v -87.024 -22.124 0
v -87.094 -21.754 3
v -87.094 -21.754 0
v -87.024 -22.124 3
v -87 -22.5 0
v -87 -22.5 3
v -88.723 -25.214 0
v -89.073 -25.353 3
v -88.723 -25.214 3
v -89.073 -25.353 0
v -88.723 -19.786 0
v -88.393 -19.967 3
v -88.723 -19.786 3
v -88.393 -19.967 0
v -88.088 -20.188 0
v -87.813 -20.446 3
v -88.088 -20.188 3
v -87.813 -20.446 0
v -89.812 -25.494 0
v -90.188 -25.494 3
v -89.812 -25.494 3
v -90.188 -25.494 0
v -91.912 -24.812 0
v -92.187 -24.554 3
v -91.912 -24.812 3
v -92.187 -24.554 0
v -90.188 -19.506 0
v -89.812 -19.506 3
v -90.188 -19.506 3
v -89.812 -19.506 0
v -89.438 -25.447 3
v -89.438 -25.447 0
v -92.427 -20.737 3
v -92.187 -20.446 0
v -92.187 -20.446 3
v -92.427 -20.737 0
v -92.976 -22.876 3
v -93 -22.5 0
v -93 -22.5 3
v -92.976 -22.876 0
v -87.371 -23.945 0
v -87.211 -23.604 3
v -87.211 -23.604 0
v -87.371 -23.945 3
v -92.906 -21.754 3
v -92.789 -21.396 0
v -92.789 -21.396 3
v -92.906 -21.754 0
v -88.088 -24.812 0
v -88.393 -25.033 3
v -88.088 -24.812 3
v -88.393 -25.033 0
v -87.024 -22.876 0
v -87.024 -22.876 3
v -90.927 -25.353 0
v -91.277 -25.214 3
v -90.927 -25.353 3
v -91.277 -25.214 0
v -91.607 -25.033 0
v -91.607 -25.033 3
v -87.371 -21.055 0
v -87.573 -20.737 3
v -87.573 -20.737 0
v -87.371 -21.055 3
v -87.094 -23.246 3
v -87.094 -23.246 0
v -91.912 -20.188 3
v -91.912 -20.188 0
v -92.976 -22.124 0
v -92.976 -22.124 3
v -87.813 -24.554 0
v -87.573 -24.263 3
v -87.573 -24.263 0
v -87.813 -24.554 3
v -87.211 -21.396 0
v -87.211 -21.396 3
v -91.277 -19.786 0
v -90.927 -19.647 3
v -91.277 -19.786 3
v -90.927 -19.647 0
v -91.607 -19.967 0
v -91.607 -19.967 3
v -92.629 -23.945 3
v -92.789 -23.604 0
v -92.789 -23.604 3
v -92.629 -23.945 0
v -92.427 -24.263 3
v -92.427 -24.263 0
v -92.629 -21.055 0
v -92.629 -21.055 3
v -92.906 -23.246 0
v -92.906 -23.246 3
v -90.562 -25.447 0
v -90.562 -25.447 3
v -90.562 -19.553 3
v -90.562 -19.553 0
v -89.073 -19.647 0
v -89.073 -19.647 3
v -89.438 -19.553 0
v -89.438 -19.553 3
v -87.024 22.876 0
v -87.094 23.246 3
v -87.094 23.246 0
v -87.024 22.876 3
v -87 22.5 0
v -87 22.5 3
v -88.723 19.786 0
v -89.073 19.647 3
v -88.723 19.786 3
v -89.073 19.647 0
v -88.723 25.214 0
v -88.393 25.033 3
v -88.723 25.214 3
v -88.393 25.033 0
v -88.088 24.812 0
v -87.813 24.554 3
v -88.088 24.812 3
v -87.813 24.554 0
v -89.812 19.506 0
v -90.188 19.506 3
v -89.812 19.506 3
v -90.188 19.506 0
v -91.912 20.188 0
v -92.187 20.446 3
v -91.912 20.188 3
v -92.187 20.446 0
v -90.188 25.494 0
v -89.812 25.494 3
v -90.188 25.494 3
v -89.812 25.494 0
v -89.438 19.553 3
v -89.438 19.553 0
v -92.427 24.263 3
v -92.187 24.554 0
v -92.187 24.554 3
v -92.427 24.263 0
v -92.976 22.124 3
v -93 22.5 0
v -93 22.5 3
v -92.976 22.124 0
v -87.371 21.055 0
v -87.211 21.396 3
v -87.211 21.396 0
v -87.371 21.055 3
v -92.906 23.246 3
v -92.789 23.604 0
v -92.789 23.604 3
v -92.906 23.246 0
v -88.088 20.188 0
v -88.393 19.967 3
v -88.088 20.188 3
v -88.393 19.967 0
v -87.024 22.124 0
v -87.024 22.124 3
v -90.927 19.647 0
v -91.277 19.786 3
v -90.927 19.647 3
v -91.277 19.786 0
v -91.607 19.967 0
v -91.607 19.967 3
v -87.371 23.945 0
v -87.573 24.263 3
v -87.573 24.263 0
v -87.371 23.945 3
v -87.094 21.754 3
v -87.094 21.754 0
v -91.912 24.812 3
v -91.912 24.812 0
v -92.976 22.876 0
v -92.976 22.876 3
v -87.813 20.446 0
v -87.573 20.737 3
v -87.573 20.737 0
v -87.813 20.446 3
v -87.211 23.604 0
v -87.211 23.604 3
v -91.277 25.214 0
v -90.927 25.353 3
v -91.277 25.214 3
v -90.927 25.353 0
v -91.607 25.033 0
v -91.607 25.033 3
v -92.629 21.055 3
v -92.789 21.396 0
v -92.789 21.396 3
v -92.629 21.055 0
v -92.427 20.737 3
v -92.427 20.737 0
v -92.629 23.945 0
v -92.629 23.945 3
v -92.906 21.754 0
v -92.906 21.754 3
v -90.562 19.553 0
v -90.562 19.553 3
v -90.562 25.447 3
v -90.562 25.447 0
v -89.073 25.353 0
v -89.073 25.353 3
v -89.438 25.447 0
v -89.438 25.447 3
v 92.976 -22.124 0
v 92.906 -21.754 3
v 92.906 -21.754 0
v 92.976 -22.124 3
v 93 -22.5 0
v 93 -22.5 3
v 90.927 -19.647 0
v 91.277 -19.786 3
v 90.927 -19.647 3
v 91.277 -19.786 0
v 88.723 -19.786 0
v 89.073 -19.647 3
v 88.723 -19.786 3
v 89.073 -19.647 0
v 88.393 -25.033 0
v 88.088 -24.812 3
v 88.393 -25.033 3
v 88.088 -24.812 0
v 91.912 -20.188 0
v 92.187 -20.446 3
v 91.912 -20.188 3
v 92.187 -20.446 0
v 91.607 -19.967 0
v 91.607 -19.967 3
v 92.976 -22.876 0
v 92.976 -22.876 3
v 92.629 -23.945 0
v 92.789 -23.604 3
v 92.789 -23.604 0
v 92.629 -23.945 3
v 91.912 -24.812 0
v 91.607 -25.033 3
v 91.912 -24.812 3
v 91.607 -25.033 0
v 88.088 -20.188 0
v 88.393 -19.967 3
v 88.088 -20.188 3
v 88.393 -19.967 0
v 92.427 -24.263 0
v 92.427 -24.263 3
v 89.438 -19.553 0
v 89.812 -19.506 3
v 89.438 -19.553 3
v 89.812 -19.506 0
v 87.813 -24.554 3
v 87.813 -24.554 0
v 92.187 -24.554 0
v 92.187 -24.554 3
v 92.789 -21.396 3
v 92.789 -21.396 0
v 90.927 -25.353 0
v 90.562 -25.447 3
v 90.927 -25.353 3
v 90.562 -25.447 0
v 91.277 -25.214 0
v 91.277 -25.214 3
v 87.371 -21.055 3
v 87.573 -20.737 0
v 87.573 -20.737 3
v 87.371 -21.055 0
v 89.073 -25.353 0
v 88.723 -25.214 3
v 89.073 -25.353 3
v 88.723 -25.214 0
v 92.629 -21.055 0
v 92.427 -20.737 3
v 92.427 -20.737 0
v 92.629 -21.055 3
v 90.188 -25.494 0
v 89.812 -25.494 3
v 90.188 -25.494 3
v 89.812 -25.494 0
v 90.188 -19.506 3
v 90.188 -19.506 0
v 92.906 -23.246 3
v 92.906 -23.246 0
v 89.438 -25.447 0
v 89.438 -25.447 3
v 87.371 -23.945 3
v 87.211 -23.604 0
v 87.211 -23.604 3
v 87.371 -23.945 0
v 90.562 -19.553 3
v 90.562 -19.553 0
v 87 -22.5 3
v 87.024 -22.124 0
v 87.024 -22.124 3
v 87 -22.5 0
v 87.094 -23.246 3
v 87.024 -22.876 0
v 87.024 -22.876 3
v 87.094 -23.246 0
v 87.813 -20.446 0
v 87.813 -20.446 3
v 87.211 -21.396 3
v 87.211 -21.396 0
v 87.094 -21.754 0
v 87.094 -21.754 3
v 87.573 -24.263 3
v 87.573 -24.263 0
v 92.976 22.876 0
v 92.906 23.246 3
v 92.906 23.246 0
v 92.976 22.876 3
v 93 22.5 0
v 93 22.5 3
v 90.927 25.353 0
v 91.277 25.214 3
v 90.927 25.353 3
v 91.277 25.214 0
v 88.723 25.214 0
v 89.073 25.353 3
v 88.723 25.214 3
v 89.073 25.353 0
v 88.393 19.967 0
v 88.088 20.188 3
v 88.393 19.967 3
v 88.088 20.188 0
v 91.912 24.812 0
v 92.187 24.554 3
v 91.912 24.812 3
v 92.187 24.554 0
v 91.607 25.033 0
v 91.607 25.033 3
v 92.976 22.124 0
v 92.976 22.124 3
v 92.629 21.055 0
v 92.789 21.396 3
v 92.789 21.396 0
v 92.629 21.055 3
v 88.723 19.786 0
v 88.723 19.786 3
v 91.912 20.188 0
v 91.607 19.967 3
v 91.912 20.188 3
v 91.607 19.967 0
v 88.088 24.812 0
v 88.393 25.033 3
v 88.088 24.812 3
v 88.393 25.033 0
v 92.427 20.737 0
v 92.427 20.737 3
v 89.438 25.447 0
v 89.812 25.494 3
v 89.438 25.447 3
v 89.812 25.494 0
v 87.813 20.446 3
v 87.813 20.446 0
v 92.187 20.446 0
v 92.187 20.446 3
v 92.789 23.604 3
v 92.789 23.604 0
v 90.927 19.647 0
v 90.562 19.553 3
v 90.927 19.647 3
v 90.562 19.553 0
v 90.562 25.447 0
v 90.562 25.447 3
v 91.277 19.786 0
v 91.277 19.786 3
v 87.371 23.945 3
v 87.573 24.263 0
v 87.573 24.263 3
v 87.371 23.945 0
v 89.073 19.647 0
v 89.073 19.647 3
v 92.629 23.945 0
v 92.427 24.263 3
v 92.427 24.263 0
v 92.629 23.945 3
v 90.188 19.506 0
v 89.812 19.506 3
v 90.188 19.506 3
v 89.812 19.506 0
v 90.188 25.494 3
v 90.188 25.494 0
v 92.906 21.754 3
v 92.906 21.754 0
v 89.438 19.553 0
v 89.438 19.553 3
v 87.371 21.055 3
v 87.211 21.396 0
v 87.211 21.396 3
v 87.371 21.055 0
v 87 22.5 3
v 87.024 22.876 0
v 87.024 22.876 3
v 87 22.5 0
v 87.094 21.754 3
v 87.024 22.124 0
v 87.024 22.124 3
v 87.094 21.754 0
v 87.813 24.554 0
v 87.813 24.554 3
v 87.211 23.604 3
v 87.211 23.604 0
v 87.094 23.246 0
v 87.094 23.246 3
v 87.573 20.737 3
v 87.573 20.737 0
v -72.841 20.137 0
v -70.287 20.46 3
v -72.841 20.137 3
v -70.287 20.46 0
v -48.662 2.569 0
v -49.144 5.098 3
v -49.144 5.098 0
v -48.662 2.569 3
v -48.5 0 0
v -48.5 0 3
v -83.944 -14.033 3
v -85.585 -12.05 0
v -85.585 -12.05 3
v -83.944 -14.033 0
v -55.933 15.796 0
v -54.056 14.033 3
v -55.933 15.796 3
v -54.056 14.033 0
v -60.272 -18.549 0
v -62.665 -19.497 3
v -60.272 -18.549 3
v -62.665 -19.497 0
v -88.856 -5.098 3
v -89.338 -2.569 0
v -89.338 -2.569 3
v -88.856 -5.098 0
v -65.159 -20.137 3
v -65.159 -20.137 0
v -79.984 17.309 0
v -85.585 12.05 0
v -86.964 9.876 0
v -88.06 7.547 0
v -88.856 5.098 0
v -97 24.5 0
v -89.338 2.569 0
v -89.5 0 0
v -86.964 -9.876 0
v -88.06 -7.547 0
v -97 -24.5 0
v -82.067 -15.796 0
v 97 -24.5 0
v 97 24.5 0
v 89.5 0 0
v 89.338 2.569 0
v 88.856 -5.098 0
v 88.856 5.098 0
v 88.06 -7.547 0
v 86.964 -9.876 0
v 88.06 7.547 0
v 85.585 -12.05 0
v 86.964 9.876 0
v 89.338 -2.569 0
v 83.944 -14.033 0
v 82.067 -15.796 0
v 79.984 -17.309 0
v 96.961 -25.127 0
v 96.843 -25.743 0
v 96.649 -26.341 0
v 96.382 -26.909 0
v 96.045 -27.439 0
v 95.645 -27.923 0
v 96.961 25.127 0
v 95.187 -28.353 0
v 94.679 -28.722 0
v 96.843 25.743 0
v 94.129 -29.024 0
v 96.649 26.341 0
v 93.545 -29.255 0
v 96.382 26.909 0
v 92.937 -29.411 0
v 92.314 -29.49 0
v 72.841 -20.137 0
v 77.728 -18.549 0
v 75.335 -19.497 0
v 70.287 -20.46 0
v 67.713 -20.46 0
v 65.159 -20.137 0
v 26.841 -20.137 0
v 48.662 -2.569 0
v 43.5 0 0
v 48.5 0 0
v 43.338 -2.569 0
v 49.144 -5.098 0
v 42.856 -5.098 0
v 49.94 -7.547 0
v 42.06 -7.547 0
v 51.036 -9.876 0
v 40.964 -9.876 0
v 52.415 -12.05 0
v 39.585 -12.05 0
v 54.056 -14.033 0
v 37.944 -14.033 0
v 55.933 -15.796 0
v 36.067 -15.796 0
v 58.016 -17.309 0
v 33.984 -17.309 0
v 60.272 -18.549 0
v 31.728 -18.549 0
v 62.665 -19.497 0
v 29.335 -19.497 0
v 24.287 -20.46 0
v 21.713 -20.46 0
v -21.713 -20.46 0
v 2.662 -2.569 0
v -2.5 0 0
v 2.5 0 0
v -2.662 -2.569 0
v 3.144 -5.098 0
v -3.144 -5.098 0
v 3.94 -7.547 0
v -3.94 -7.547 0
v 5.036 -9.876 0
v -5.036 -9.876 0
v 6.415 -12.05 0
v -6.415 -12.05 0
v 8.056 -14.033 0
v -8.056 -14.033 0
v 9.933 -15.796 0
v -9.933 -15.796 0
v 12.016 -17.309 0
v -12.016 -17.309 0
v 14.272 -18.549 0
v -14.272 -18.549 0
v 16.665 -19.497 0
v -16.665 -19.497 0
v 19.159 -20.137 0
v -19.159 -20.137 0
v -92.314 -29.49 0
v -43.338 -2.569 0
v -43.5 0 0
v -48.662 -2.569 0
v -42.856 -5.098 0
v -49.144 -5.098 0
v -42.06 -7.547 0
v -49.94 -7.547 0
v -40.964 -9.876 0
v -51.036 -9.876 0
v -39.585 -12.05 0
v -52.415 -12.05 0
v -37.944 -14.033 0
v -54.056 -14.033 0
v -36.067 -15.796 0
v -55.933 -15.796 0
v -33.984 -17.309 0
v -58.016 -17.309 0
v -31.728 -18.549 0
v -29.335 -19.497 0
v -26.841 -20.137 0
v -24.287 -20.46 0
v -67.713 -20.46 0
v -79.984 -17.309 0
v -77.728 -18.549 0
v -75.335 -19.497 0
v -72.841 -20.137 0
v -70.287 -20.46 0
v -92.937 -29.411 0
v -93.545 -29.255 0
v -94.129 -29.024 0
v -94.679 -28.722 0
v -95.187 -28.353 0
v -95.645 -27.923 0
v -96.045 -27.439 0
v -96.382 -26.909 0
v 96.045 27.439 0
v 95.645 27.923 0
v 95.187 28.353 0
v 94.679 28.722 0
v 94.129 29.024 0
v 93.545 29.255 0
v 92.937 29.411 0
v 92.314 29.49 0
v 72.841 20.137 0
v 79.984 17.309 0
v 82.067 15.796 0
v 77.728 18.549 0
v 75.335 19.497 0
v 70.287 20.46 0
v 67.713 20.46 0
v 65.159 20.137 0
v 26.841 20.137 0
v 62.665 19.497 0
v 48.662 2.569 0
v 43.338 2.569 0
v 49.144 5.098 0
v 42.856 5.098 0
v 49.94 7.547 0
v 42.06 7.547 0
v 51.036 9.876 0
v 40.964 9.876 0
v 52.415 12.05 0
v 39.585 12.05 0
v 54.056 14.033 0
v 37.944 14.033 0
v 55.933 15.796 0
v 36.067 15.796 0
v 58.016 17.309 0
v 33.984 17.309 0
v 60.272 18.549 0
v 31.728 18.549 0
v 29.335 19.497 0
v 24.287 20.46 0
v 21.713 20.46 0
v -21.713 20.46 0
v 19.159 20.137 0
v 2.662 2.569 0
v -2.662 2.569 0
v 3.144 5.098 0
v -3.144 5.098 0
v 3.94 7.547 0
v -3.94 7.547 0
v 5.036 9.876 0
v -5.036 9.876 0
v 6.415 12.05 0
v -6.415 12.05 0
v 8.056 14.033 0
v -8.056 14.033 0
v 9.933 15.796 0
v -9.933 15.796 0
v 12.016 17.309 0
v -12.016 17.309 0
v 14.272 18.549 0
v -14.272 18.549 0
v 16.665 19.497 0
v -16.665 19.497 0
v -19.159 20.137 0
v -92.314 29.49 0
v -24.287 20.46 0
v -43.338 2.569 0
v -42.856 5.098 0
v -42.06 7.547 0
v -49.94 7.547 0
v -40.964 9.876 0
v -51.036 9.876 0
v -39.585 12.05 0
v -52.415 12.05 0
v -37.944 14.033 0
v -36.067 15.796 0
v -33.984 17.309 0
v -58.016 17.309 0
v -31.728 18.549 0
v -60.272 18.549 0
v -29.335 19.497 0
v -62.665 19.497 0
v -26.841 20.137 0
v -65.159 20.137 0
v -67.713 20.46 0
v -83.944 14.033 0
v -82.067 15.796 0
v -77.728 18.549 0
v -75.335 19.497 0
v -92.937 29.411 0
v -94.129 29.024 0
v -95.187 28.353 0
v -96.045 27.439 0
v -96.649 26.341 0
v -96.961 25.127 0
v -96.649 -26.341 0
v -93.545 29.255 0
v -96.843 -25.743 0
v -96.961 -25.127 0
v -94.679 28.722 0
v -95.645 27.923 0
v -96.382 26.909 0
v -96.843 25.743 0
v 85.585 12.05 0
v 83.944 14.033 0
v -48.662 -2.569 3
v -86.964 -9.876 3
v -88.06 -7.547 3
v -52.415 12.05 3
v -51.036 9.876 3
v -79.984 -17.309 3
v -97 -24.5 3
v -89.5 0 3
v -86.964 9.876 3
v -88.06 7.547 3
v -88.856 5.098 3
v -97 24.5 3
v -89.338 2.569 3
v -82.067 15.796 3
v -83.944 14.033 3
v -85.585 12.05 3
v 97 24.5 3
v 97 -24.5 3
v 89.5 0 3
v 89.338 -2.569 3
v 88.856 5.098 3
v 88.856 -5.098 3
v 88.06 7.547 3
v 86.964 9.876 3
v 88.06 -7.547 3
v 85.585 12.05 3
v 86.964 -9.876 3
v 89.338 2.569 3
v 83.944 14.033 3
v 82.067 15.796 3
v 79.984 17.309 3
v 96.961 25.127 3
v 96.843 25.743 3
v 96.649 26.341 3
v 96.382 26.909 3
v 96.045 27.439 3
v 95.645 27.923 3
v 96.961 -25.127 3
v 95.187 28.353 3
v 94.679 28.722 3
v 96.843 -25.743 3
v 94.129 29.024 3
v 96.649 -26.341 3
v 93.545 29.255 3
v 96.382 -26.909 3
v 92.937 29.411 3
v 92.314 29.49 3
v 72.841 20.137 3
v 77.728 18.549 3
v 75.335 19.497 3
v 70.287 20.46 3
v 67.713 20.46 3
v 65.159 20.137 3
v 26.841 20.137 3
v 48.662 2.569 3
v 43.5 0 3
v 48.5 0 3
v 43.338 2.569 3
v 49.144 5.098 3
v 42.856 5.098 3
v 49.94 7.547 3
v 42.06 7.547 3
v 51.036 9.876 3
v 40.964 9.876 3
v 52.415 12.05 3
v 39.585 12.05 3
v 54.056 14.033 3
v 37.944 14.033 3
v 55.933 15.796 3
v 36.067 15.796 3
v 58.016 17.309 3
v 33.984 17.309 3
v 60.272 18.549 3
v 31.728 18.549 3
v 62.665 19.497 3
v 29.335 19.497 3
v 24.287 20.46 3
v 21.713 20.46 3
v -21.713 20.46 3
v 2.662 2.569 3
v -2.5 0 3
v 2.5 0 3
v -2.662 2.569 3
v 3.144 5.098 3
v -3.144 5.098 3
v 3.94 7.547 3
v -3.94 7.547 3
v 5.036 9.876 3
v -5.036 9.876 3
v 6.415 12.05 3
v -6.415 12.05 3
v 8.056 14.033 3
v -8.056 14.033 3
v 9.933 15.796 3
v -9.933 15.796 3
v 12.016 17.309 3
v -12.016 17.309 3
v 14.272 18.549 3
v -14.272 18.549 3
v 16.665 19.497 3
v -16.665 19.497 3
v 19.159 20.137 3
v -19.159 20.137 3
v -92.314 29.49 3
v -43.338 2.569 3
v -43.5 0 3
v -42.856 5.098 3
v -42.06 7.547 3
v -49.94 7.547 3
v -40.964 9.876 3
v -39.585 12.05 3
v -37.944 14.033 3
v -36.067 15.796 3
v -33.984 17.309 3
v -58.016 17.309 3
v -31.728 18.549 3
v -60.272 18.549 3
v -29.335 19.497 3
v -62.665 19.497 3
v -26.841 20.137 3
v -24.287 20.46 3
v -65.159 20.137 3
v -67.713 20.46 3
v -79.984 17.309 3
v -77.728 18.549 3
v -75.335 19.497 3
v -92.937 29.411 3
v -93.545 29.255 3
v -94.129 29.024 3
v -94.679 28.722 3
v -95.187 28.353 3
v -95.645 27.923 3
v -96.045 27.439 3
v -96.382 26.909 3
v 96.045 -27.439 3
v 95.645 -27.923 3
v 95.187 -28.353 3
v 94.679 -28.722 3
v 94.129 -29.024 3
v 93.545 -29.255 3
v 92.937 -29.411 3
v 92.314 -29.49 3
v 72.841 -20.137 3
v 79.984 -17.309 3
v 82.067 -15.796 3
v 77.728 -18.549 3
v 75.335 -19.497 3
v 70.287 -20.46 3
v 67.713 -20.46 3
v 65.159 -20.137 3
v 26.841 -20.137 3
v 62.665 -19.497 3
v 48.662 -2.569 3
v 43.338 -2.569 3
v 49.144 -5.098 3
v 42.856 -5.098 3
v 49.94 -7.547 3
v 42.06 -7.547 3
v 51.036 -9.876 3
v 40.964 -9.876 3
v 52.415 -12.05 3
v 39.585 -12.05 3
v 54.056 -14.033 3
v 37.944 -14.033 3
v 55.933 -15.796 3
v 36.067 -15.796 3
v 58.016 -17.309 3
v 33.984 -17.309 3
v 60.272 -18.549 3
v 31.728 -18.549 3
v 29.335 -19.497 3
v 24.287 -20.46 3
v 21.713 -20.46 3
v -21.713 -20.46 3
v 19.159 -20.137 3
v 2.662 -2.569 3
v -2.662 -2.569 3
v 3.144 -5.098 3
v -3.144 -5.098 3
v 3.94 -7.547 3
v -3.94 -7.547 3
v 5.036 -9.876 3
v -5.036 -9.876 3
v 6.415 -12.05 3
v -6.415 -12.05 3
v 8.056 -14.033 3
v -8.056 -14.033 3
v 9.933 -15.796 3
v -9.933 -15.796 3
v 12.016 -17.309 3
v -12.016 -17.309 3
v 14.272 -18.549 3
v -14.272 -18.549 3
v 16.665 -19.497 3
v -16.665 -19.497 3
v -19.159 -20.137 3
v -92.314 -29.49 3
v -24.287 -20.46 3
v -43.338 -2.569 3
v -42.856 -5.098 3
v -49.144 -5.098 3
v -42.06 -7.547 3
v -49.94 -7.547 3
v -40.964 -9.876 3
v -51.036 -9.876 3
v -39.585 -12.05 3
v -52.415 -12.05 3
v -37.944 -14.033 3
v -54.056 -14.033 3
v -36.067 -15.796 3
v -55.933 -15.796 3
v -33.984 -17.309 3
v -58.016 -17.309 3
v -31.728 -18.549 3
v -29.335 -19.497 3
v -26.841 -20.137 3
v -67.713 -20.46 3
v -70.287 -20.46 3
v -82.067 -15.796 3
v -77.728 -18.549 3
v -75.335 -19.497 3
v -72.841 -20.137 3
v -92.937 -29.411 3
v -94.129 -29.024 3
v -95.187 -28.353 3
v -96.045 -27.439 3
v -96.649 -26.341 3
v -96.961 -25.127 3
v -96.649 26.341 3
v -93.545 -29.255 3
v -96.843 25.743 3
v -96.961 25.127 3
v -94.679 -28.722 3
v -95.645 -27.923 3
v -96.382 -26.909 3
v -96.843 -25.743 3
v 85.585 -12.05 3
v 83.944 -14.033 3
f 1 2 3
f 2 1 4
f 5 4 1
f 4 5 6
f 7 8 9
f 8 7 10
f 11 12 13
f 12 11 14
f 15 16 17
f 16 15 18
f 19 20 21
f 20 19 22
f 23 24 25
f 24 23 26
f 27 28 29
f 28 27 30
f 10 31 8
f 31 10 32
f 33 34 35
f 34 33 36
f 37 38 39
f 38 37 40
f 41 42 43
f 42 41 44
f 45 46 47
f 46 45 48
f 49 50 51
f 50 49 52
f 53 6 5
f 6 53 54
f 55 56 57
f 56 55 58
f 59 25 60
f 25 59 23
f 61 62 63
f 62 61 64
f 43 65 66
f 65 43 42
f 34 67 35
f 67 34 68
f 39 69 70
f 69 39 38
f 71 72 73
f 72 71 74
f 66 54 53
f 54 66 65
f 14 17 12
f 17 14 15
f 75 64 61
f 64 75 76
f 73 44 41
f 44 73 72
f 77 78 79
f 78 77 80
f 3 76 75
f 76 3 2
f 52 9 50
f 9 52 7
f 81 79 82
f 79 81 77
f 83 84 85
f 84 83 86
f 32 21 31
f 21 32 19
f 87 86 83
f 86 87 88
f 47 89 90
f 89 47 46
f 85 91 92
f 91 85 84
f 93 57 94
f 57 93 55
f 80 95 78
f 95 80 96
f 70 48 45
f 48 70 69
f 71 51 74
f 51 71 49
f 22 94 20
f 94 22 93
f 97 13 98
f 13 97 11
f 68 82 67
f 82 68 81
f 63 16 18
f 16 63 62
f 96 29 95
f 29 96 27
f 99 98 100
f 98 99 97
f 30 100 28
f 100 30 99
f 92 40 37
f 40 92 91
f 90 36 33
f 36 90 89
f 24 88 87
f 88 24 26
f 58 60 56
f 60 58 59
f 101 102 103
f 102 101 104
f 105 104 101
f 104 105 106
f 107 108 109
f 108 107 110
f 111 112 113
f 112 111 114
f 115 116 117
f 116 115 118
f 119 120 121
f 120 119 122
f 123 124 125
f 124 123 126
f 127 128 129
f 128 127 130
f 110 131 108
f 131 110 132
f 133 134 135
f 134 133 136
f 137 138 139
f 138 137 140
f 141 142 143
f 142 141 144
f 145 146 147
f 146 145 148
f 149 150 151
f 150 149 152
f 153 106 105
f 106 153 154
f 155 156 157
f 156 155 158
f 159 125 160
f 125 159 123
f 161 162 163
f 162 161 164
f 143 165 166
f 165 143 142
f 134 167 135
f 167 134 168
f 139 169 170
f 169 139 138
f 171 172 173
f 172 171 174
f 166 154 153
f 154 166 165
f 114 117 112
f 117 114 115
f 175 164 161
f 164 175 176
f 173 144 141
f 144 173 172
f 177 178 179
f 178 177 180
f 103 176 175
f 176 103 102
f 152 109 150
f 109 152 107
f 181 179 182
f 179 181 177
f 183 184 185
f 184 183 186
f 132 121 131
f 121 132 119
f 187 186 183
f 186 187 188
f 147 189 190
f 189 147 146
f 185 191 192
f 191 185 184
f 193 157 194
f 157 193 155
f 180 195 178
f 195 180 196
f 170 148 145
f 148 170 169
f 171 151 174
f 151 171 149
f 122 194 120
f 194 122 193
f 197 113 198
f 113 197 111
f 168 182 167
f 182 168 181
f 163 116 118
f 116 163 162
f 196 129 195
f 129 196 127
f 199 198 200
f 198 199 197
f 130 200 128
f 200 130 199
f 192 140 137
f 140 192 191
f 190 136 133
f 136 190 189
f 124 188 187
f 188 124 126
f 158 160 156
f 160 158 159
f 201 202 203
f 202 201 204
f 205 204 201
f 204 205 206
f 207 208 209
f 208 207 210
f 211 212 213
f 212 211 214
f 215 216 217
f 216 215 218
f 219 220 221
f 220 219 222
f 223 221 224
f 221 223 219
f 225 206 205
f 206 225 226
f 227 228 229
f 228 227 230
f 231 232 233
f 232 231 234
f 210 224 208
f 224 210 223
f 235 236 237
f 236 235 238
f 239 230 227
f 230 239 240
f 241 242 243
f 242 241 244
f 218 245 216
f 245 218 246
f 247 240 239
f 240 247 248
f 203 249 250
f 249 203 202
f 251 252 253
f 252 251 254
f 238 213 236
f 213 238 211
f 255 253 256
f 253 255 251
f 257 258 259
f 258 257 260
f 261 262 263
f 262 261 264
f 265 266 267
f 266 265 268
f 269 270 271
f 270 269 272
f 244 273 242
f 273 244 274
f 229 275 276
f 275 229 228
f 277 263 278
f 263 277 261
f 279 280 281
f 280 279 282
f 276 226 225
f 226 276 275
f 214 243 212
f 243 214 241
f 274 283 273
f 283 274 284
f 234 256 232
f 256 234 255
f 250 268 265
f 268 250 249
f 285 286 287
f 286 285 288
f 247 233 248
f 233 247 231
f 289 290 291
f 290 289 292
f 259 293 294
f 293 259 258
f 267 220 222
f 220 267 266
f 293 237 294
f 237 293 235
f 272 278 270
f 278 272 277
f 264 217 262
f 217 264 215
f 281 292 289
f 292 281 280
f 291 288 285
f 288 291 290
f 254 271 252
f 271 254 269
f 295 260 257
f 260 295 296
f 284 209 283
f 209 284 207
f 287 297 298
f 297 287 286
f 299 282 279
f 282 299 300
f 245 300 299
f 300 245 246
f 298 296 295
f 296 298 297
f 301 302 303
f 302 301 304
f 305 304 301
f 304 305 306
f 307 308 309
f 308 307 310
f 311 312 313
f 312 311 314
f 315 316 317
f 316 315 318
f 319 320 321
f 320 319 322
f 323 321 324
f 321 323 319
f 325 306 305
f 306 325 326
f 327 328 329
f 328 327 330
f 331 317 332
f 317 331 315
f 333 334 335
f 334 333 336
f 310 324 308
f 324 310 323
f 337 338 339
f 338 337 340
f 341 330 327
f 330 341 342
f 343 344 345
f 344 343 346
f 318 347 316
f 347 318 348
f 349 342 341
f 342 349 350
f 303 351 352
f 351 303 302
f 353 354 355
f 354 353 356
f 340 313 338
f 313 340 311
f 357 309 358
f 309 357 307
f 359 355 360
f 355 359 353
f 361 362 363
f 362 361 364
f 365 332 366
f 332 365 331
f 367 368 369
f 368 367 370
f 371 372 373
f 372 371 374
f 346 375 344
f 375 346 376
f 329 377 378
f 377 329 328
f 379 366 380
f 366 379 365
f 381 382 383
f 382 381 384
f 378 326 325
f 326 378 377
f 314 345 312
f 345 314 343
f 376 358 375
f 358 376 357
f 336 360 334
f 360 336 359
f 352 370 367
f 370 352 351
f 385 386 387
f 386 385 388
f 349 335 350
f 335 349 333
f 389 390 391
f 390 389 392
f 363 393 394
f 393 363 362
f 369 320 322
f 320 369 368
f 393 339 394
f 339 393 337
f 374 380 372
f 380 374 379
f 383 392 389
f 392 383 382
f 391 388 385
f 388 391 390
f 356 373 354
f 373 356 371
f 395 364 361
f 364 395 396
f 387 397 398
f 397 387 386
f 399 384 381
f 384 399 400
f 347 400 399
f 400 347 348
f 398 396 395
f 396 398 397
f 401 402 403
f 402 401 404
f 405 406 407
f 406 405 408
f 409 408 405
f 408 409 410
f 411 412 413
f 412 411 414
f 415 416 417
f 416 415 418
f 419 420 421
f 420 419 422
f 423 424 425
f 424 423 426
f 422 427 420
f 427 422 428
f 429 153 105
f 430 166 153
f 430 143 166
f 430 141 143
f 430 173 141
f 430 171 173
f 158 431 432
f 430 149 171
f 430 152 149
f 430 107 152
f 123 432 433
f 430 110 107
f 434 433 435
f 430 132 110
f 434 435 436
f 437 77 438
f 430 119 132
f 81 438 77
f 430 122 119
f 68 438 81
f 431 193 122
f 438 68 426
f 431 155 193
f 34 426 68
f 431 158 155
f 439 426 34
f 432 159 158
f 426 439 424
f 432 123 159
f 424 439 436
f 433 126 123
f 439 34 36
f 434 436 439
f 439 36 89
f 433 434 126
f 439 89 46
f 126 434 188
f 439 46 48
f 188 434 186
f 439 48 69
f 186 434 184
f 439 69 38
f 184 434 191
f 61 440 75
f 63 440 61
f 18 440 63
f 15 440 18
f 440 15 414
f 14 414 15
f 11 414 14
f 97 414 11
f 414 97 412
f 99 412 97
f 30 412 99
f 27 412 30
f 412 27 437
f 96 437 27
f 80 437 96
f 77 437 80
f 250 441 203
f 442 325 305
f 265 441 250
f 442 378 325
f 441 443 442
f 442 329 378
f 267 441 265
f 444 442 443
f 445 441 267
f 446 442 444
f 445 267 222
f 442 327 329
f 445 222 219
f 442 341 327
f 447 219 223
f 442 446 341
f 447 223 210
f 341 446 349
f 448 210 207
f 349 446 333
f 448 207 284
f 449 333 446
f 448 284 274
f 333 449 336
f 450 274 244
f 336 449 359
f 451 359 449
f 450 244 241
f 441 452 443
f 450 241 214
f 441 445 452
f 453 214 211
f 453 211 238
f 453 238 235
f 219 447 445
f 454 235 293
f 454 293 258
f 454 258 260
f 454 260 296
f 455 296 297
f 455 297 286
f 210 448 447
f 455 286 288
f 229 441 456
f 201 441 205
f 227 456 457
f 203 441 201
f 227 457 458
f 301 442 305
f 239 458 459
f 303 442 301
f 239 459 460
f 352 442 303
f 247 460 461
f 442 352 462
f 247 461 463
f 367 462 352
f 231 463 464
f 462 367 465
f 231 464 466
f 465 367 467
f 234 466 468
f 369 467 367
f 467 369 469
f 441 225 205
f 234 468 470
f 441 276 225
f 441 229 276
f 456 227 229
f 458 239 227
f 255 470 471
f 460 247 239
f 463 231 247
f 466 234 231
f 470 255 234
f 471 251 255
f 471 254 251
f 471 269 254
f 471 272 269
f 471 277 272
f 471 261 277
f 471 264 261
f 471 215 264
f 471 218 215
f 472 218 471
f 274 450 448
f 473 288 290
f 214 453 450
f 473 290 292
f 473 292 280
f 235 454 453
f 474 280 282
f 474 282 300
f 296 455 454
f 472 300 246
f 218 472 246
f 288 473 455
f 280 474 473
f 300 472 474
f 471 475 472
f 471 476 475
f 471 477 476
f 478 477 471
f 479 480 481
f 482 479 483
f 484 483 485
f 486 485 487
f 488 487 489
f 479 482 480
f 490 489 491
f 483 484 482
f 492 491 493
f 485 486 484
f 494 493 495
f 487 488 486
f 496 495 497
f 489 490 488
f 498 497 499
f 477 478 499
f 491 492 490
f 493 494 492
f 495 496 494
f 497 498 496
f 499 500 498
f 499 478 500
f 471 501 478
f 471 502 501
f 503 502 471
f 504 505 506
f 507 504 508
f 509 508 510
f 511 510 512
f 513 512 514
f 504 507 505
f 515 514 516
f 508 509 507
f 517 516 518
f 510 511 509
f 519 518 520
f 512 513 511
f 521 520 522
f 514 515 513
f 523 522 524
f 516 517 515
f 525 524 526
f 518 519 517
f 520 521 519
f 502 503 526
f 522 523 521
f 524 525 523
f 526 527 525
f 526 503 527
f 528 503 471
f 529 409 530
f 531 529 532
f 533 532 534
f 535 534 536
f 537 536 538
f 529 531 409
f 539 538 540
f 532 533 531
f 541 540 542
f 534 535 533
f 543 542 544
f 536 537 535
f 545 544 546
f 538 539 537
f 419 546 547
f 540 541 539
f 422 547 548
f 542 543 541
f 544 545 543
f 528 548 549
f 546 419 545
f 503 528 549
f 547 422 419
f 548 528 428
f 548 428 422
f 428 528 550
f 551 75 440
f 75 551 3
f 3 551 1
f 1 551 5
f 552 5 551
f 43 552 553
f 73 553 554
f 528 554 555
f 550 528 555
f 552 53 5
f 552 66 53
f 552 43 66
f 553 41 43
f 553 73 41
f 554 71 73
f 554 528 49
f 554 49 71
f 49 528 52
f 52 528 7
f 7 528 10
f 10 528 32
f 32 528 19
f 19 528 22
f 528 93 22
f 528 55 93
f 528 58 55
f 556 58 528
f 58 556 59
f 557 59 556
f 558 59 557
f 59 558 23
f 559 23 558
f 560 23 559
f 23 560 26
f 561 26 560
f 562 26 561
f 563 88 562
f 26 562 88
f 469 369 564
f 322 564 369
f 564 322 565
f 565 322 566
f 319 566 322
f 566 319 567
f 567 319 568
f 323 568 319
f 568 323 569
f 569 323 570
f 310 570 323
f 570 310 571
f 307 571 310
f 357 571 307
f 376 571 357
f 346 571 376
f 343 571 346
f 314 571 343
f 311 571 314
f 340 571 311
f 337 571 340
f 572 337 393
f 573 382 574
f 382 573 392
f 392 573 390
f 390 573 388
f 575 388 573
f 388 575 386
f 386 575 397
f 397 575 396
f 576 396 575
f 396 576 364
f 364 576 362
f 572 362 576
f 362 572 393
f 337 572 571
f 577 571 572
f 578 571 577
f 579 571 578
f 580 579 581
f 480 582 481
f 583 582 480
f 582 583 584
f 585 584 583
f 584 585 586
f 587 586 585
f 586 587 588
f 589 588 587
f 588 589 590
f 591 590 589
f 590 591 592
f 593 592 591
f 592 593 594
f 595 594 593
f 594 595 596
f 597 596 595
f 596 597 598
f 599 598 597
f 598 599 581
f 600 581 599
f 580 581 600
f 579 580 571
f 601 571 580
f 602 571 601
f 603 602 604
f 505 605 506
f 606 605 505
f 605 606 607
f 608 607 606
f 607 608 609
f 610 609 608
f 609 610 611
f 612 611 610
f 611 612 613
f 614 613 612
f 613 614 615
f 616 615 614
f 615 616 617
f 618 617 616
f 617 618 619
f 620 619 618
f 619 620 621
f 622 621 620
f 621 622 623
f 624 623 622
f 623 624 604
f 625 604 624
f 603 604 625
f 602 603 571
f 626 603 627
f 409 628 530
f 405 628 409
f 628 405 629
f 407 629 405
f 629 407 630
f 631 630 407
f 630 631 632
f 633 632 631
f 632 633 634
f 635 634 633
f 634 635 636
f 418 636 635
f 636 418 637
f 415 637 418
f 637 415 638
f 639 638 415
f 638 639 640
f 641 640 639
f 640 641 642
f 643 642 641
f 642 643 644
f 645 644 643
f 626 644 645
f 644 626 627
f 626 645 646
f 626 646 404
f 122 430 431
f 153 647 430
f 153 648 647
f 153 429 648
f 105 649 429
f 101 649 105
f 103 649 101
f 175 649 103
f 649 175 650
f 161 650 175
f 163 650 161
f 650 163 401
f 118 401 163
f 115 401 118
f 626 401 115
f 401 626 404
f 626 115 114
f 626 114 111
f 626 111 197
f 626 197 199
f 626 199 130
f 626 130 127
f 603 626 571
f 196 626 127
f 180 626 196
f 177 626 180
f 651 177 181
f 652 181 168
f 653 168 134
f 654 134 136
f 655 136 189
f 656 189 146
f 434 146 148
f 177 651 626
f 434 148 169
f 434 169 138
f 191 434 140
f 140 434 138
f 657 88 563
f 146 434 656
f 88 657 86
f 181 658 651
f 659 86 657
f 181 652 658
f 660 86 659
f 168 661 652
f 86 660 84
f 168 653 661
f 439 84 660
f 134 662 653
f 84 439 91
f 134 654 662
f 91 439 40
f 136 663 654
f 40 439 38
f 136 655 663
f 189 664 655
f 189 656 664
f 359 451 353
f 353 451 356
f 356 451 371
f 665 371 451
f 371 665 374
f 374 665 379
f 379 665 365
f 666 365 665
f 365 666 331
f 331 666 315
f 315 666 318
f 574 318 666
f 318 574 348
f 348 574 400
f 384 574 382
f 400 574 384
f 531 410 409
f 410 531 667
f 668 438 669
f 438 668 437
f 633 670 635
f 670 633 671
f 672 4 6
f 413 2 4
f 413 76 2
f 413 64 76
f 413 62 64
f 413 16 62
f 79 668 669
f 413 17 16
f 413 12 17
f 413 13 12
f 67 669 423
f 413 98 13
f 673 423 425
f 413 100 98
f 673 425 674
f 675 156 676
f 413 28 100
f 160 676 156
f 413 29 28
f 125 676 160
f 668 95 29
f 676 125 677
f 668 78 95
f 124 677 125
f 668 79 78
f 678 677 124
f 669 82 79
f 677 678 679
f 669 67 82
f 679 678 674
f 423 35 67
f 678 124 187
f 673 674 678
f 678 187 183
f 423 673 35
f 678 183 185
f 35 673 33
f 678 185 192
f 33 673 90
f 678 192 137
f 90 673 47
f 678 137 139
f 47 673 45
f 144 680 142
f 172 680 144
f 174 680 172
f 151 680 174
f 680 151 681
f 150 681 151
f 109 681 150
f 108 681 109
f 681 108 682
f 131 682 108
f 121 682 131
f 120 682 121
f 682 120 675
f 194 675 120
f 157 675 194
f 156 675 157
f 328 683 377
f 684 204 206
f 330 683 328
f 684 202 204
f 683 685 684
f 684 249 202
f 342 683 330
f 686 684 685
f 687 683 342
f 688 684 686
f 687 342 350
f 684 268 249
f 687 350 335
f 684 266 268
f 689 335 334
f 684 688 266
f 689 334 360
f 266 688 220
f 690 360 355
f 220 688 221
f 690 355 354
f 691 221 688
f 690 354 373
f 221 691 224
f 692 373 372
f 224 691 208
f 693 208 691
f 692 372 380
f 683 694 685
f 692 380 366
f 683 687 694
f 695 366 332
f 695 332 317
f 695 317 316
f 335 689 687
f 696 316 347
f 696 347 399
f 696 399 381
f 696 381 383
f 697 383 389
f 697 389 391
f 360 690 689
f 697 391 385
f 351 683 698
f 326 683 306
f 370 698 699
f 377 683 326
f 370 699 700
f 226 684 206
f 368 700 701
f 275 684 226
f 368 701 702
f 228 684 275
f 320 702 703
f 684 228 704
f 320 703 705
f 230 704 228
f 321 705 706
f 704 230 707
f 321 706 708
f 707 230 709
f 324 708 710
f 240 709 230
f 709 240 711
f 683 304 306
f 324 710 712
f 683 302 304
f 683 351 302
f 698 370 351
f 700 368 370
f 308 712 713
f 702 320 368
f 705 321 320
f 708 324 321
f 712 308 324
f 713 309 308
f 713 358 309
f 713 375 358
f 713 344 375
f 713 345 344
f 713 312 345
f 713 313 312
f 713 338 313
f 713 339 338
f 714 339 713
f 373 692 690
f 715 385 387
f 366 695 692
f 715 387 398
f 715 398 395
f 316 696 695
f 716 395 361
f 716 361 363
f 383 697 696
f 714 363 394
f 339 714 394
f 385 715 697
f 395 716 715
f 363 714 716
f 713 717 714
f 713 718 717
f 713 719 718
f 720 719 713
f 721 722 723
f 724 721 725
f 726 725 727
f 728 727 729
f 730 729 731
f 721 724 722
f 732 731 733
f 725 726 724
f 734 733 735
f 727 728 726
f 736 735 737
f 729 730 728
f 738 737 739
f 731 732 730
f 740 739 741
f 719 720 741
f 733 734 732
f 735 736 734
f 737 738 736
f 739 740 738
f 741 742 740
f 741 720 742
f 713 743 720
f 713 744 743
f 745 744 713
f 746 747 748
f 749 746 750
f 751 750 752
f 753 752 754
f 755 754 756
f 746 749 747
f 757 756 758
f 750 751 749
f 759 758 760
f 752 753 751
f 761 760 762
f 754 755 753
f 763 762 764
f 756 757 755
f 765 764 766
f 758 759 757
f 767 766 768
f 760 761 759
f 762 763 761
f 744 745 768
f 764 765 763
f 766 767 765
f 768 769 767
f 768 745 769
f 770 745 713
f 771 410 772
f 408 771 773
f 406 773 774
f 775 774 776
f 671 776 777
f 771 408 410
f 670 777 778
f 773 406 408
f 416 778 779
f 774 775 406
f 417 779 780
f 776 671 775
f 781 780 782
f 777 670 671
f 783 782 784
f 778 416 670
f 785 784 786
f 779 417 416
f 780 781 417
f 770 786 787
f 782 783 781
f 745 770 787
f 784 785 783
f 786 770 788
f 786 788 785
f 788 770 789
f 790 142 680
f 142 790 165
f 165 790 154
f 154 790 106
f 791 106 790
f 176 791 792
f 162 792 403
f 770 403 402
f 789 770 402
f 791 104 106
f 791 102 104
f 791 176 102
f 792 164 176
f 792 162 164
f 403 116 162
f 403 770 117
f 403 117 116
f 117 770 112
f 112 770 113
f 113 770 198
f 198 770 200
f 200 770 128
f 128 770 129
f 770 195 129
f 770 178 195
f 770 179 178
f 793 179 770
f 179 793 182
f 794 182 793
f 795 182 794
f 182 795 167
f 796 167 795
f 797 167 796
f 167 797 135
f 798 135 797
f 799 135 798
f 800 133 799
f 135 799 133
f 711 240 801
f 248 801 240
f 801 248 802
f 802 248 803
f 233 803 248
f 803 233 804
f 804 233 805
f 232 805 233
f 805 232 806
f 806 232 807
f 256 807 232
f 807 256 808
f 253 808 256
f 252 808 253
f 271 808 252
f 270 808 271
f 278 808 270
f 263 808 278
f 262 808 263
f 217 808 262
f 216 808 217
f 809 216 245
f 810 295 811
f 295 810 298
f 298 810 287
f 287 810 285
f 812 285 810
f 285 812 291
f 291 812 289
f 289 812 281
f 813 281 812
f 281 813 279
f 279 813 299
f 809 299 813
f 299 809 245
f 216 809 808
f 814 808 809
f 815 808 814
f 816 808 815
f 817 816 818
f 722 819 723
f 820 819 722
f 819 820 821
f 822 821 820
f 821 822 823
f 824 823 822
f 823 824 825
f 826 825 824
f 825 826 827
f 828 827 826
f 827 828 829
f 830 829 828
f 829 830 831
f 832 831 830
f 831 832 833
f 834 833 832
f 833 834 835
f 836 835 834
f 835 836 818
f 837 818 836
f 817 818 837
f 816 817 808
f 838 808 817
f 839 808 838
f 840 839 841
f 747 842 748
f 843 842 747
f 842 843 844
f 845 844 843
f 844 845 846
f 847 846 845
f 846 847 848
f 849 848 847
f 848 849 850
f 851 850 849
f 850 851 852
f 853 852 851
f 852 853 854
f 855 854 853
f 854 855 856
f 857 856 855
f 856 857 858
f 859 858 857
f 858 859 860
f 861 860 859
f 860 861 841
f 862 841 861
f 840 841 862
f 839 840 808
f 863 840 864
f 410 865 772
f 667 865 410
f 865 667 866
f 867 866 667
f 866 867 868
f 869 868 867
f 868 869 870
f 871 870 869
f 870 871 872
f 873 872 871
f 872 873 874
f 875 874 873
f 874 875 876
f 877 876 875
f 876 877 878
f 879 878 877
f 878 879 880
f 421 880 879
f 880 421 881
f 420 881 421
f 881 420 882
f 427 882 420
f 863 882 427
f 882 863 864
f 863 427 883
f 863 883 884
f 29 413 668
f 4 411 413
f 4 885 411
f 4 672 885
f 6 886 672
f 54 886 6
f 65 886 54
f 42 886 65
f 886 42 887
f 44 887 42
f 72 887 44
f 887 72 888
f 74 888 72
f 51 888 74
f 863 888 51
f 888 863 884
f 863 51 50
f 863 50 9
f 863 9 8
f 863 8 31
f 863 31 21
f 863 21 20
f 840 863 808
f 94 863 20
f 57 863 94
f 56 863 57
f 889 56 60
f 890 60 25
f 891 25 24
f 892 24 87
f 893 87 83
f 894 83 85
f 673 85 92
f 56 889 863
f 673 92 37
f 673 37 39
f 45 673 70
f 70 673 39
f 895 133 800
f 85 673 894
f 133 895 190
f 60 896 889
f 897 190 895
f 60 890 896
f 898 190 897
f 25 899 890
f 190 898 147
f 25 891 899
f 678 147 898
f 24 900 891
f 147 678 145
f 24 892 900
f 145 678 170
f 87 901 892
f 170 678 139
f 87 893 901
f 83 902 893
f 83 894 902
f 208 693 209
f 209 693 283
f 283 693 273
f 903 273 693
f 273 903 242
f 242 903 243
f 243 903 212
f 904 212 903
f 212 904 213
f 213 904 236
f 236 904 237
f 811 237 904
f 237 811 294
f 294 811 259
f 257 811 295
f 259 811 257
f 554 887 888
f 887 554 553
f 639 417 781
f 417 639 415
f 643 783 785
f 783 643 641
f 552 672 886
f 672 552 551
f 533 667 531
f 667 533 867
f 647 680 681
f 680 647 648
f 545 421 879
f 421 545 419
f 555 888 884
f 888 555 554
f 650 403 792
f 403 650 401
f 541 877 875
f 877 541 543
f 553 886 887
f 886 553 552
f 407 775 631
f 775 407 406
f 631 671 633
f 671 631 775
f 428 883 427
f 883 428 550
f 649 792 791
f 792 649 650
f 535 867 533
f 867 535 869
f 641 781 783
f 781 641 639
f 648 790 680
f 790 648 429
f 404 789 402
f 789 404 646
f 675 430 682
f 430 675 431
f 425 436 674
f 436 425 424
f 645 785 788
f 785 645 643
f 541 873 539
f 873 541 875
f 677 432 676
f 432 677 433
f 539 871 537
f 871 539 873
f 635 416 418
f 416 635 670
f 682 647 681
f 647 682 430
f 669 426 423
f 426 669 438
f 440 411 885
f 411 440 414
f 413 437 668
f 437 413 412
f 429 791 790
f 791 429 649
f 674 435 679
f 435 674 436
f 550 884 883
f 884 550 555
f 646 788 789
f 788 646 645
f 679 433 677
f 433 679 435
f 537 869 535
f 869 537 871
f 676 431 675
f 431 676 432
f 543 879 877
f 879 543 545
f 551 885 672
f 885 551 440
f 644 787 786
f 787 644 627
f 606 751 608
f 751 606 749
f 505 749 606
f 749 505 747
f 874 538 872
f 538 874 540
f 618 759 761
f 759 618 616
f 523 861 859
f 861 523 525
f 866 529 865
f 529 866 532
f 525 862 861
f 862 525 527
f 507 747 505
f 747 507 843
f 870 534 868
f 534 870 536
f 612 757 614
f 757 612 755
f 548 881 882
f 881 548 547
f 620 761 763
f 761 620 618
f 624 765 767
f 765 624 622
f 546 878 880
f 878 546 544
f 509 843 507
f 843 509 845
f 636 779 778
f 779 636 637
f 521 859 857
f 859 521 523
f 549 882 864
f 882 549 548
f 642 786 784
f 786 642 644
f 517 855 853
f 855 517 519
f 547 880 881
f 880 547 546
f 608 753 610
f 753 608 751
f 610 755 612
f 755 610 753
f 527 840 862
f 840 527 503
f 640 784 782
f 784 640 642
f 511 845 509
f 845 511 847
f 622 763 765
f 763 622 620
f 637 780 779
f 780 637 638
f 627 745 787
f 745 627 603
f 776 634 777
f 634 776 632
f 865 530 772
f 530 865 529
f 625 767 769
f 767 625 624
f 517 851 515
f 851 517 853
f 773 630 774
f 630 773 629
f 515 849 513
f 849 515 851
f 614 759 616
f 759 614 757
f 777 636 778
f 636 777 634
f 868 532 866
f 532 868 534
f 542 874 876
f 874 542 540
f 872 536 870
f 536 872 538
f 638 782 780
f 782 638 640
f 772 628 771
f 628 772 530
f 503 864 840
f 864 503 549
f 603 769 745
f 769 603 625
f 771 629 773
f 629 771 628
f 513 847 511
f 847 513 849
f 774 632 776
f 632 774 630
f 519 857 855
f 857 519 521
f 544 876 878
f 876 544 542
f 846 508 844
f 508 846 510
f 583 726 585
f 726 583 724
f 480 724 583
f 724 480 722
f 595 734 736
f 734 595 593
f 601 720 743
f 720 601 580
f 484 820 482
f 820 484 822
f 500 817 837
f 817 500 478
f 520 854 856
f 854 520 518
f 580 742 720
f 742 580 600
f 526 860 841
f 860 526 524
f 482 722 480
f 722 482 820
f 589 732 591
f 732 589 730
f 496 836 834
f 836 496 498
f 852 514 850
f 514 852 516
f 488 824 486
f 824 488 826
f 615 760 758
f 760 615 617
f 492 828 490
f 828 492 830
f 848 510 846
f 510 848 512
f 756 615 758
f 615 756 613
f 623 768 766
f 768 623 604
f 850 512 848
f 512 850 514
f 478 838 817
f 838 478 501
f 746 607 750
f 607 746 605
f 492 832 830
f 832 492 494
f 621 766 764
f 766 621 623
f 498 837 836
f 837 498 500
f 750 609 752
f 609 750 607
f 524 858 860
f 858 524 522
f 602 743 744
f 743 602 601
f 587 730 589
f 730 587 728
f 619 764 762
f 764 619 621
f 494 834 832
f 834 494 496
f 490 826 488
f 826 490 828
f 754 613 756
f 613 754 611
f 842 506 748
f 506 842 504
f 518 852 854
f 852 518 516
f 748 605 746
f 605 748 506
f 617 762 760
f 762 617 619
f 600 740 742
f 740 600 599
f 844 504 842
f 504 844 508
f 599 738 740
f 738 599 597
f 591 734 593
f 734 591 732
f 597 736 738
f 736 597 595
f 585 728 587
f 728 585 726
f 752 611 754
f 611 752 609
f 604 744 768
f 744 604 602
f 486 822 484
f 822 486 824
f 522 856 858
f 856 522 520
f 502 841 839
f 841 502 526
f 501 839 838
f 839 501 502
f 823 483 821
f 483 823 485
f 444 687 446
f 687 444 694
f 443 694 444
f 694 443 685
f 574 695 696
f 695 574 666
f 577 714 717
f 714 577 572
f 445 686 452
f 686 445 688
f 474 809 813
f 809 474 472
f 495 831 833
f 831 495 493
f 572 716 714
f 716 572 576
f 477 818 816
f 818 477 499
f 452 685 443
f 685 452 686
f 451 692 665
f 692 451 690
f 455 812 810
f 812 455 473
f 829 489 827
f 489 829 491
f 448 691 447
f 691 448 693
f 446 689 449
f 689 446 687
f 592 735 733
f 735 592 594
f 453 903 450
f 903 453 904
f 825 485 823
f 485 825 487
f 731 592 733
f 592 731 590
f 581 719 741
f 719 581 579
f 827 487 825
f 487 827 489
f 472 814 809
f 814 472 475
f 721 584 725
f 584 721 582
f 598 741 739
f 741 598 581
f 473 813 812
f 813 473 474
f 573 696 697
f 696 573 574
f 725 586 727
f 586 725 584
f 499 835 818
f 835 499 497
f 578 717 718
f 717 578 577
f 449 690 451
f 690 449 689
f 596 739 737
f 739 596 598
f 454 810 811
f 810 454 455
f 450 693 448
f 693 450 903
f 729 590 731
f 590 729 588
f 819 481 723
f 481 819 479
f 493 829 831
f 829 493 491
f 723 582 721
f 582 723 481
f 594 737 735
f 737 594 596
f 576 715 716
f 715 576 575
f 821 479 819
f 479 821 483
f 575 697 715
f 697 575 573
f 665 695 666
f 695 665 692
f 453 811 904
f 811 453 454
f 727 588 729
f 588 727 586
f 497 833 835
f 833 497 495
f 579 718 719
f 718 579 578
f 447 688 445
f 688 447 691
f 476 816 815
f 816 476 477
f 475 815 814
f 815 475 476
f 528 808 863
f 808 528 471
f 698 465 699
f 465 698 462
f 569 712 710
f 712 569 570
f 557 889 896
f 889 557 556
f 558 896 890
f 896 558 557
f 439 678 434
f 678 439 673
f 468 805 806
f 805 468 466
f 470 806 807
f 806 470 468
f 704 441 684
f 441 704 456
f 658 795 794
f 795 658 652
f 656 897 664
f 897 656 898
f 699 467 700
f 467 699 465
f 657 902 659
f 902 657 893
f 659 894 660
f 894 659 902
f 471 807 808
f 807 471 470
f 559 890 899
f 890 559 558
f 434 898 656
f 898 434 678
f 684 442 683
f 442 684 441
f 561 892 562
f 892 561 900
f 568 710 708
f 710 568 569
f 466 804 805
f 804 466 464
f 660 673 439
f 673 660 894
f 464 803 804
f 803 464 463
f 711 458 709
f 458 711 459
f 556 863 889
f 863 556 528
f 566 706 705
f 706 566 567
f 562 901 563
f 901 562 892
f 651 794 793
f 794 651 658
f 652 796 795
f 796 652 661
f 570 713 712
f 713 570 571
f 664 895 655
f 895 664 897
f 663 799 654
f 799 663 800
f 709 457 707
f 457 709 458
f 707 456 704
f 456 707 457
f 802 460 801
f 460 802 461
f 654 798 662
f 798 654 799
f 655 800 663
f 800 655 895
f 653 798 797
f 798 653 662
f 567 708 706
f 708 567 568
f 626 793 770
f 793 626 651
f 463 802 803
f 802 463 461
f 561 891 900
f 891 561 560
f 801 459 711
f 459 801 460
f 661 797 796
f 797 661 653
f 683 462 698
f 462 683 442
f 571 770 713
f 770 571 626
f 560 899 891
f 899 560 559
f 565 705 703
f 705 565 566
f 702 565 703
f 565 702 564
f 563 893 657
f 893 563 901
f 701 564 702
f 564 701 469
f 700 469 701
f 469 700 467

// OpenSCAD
$fn = 50;


difference() {
	union() {
		hull() {
			translate(v = [-92.0000000000, 24.5000000000, 0]) {
				cylinder(h = 3, r = 5);
			}
			translate(v = [92.0000000000, 24.5000000000, 0]) {
				cylinder(h = 3, r = 5);
			}
			translate(v = [-92.0000000000, -24.5000000000, 0]) {
				cylinder(h = 3, r = 5);
			}
			translate(v = [92.0000000000, -24.5000000000, 0]) {
				cylinder(h = 3, r = 5);
			}
		}
	}
	union() {
		#translate(v = [-90.0000000000, -22.5000000000, -100.0000000000]) {
			cylinder(h = 200, r = 3.0000000000);
		}
		#translate(v = [-90.0000000000, 22.5000000000, -100.0000000000]) {
			cylinder(h = 200, r = 3.0000000000);
		}
		#translate(v = [90.0000000000, -22.5000000000, -100.0000000000]) {
			cylinder(h = 200, r = 3.0000000000);
		}
		#translate(v = [90.0000000000, 22.5000000000, -100.0000000000]) {
			cylinder(h = 200, r = 3.0000000000);
		}
		#translate(v = [-69.0000000000, 0, 0]) {
			cylinder(h = 3, r = 20.5000000000);
		}
		#translate(v = [-23.0000000000, 0, 0]) {
			cylinder(h = 3, r = 20.5000000000);
		}
		#translate(v = [23.0000000000, 0, 0]) {
			cylinder(h = 3, r = 20.5000000000);
		}
		#translate(v = [69.0000000000, 0, 0]) {
			cylinder(h = 3, r = 20.5000000000);
		}
	}
}
